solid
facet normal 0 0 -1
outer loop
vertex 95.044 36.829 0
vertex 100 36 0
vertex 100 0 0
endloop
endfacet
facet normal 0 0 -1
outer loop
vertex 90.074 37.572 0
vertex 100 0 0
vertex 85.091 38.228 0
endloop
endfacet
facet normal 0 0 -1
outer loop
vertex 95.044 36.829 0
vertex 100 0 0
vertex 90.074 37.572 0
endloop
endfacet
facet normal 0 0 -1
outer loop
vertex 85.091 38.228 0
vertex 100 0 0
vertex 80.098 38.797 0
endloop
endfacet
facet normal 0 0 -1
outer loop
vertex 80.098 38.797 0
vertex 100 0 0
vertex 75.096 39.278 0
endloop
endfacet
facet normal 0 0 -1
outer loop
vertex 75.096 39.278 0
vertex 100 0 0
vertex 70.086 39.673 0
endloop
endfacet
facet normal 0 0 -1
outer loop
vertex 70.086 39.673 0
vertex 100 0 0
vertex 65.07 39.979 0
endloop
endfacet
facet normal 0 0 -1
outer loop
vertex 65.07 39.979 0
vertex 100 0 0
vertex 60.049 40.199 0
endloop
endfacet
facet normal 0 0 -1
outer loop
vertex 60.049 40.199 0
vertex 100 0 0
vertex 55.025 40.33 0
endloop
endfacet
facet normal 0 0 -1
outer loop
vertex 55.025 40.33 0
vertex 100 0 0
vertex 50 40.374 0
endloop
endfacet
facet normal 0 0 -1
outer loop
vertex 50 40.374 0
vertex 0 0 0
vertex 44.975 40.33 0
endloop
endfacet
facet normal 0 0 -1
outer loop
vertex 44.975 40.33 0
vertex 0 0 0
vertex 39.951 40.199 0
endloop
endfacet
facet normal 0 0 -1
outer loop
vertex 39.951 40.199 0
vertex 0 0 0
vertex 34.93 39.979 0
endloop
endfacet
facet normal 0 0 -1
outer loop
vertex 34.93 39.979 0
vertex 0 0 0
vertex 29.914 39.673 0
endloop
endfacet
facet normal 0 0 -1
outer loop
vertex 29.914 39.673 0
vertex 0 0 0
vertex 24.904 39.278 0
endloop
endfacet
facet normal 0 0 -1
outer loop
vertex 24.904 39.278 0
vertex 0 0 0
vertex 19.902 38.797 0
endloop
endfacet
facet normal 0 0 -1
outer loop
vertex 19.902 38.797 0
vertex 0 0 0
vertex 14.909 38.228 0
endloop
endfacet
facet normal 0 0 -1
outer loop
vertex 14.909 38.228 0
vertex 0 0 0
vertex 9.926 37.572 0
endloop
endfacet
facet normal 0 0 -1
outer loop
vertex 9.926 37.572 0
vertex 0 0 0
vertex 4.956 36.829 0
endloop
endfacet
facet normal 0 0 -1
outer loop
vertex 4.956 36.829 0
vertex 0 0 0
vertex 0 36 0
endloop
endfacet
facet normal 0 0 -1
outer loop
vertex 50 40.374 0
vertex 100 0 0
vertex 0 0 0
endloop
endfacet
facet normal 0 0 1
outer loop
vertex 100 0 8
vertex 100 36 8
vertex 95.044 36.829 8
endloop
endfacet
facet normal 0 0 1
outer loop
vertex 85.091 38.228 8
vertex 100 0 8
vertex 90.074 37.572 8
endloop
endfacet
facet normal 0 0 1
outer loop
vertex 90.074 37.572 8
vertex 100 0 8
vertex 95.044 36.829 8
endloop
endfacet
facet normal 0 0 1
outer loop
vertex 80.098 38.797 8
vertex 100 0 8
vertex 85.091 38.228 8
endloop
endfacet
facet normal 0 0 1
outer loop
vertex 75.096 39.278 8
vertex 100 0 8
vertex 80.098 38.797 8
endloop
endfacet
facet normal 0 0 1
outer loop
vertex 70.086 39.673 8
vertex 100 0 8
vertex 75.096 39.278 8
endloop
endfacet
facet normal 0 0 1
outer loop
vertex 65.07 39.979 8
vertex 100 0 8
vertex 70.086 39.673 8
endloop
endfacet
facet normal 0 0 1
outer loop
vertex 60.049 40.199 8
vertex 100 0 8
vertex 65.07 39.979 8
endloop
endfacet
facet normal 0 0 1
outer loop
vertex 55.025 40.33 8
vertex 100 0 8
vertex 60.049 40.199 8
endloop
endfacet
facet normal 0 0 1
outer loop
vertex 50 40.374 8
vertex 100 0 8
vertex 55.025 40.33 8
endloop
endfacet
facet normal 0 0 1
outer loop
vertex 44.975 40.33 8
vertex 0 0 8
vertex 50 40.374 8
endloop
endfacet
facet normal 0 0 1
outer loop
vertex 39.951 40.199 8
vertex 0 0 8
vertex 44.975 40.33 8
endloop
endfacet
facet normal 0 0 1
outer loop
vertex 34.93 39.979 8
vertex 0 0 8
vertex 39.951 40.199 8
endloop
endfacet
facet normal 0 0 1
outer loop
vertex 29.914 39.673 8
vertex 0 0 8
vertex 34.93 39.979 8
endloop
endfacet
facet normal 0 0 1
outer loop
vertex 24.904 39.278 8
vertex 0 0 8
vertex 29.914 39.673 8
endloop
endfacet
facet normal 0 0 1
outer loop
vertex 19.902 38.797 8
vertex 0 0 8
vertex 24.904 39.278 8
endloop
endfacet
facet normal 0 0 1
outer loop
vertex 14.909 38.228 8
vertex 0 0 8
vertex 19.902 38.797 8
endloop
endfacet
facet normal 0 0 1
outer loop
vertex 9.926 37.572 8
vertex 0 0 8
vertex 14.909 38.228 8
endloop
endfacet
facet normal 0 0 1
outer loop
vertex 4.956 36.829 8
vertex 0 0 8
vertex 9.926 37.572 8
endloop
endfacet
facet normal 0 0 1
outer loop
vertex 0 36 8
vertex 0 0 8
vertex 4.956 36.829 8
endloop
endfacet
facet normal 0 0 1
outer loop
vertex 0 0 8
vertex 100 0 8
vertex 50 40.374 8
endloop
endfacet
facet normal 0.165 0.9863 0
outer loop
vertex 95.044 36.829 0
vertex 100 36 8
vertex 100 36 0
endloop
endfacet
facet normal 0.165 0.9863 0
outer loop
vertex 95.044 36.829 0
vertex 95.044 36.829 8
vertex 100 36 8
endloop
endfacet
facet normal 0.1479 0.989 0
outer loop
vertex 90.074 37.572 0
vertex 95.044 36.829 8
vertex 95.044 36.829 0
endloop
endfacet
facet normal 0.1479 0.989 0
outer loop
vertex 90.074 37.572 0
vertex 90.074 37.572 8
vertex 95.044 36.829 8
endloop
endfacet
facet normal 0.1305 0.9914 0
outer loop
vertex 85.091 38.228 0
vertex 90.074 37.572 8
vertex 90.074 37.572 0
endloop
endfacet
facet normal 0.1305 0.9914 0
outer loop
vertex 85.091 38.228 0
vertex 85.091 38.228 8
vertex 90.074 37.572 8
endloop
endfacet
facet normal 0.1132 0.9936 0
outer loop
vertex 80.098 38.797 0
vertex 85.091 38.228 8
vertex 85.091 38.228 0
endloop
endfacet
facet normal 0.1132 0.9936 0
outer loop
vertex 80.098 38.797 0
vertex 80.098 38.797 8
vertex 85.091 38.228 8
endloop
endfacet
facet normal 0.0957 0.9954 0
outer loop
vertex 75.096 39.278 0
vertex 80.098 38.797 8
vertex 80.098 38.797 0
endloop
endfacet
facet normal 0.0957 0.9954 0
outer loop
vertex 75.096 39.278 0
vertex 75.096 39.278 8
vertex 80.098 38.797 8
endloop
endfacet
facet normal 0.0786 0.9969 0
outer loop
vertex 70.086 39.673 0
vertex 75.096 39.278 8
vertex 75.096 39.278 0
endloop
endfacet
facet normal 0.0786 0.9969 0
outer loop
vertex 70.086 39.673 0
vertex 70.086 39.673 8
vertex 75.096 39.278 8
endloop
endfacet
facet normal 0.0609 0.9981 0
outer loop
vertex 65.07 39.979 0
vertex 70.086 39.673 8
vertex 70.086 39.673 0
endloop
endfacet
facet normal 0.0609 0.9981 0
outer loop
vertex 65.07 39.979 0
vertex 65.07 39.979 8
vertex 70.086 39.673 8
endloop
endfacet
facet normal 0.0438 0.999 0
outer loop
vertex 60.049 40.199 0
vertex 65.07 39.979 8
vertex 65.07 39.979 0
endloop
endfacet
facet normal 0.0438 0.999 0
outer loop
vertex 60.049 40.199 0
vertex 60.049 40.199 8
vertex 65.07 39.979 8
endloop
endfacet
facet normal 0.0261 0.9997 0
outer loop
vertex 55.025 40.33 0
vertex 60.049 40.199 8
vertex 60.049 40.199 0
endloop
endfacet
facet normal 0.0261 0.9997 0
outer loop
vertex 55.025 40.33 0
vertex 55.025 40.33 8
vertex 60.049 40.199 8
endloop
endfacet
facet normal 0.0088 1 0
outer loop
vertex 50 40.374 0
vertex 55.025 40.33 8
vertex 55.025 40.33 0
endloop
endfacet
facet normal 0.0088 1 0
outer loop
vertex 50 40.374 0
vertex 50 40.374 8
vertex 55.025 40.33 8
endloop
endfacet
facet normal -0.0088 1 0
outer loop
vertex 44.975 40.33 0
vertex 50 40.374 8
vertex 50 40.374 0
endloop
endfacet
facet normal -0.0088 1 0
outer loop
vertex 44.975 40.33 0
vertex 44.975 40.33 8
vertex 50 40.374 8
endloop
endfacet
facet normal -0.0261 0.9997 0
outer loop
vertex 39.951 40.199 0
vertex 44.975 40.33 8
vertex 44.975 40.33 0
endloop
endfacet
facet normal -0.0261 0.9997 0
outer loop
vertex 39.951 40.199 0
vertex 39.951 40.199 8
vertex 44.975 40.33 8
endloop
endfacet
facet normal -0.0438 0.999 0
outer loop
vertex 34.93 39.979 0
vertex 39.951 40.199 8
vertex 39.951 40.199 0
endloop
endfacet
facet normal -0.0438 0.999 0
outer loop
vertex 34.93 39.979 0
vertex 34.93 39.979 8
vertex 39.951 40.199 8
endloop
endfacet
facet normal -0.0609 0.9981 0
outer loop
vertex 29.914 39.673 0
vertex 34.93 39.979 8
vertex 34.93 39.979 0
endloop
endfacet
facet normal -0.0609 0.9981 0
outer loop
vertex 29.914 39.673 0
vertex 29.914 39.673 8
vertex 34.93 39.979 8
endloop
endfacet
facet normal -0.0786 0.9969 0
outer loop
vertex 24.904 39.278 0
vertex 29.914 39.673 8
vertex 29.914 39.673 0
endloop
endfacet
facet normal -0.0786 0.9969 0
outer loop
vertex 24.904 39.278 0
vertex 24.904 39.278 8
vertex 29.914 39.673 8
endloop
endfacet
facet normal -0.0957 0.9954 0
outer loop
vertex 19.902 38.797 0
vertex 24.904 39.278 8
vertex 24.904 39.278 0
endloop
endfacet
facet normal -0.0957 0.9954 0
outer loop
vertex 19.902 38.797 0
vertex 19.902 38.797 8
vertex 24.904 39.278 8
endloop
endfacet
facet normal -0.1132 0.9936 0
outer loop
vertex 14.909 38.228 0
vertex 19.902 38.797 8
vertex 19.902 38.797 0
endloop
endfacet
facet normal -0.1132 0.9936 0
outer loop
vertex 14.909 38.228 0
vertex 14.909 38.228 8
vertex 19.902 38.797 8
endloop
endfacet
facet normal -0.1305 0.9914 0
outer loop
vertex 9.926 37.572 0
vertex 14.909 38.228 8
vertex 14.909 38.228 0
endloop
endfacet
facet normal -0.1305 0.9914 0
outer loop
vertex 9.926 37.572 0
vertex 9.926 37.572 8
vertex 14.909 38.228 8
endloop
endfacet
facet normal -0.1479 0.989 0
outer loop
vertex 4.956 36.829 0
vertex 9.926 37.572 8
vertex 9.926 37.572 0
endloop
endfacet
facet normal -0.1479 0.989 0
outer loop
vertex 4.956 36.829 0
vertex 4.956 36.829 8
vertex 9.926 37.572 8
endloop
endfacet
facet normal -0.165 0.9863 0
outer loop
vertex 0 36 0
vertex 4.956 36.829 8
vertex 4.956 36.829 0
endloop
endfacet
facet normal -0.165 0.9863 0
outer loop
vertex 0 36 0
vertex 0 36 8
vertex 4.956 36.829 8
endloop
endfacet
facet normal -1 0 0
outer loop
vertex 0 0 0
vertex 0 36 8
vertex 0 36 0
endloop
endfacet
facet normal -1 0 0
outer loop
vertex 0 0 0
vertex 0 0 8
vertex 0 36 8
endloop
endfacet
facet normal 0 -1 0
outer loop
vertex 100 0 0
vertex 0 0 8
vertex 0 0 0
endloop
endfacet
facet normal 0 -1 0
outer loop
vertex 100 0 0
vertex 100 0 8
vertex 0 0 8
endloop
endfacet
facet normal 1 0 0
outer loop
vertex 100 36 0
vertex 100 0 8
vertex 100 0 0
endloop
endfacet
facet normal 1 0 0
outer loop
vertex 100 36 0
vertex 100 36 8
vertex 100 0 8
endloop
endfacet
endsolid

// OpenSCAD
$fn = 32;

// ----------------------------------------------------------------------
// Arc profile plate: crown, 23 points
// ----------------------------------------------------------------------

// --- parameters (mm) ---
bar_l = 100;              // bar length, X
bar_w = 36;               // bar height at the ends, Y
arc_r = 287.94;           // radius of the crown arc
arc_angle = 20;           // crown arc angle, degrees
crown_rise = 4.37;        // rise of the crown over the ends
arc_step = 1;             // sampling step of the crown arc, degrees
plate_t = 8;              // plate thickness, Z

bbox_y = bar_w + crown_rise;  // full height with the crown

profile = [[100, 36], [95.044, 36.829], [90.074, 37.572], [85.091, 38.228], [80.098, 38.797], [75.096, 39.278], [70.086, 39.673], [65.07, 39.979], [60.049, 40.199], [55.025, 40.33], [50, 40.374], [44.975, 40.33], [39.951, 40.199], [34.93, 39.979], [29.914, 39.673], [24.904, 39.278], [19.902, 38.797], [14.909, 38.228], [9.926, 37.572], [4.956, 36.829], [0, 36], [0, 0], [100, 0]];  // primary outline, 23 points, counter clockwise

// --- the one profile operation ---
linear_extrude(height = plate_t) polygon(points = profile);
